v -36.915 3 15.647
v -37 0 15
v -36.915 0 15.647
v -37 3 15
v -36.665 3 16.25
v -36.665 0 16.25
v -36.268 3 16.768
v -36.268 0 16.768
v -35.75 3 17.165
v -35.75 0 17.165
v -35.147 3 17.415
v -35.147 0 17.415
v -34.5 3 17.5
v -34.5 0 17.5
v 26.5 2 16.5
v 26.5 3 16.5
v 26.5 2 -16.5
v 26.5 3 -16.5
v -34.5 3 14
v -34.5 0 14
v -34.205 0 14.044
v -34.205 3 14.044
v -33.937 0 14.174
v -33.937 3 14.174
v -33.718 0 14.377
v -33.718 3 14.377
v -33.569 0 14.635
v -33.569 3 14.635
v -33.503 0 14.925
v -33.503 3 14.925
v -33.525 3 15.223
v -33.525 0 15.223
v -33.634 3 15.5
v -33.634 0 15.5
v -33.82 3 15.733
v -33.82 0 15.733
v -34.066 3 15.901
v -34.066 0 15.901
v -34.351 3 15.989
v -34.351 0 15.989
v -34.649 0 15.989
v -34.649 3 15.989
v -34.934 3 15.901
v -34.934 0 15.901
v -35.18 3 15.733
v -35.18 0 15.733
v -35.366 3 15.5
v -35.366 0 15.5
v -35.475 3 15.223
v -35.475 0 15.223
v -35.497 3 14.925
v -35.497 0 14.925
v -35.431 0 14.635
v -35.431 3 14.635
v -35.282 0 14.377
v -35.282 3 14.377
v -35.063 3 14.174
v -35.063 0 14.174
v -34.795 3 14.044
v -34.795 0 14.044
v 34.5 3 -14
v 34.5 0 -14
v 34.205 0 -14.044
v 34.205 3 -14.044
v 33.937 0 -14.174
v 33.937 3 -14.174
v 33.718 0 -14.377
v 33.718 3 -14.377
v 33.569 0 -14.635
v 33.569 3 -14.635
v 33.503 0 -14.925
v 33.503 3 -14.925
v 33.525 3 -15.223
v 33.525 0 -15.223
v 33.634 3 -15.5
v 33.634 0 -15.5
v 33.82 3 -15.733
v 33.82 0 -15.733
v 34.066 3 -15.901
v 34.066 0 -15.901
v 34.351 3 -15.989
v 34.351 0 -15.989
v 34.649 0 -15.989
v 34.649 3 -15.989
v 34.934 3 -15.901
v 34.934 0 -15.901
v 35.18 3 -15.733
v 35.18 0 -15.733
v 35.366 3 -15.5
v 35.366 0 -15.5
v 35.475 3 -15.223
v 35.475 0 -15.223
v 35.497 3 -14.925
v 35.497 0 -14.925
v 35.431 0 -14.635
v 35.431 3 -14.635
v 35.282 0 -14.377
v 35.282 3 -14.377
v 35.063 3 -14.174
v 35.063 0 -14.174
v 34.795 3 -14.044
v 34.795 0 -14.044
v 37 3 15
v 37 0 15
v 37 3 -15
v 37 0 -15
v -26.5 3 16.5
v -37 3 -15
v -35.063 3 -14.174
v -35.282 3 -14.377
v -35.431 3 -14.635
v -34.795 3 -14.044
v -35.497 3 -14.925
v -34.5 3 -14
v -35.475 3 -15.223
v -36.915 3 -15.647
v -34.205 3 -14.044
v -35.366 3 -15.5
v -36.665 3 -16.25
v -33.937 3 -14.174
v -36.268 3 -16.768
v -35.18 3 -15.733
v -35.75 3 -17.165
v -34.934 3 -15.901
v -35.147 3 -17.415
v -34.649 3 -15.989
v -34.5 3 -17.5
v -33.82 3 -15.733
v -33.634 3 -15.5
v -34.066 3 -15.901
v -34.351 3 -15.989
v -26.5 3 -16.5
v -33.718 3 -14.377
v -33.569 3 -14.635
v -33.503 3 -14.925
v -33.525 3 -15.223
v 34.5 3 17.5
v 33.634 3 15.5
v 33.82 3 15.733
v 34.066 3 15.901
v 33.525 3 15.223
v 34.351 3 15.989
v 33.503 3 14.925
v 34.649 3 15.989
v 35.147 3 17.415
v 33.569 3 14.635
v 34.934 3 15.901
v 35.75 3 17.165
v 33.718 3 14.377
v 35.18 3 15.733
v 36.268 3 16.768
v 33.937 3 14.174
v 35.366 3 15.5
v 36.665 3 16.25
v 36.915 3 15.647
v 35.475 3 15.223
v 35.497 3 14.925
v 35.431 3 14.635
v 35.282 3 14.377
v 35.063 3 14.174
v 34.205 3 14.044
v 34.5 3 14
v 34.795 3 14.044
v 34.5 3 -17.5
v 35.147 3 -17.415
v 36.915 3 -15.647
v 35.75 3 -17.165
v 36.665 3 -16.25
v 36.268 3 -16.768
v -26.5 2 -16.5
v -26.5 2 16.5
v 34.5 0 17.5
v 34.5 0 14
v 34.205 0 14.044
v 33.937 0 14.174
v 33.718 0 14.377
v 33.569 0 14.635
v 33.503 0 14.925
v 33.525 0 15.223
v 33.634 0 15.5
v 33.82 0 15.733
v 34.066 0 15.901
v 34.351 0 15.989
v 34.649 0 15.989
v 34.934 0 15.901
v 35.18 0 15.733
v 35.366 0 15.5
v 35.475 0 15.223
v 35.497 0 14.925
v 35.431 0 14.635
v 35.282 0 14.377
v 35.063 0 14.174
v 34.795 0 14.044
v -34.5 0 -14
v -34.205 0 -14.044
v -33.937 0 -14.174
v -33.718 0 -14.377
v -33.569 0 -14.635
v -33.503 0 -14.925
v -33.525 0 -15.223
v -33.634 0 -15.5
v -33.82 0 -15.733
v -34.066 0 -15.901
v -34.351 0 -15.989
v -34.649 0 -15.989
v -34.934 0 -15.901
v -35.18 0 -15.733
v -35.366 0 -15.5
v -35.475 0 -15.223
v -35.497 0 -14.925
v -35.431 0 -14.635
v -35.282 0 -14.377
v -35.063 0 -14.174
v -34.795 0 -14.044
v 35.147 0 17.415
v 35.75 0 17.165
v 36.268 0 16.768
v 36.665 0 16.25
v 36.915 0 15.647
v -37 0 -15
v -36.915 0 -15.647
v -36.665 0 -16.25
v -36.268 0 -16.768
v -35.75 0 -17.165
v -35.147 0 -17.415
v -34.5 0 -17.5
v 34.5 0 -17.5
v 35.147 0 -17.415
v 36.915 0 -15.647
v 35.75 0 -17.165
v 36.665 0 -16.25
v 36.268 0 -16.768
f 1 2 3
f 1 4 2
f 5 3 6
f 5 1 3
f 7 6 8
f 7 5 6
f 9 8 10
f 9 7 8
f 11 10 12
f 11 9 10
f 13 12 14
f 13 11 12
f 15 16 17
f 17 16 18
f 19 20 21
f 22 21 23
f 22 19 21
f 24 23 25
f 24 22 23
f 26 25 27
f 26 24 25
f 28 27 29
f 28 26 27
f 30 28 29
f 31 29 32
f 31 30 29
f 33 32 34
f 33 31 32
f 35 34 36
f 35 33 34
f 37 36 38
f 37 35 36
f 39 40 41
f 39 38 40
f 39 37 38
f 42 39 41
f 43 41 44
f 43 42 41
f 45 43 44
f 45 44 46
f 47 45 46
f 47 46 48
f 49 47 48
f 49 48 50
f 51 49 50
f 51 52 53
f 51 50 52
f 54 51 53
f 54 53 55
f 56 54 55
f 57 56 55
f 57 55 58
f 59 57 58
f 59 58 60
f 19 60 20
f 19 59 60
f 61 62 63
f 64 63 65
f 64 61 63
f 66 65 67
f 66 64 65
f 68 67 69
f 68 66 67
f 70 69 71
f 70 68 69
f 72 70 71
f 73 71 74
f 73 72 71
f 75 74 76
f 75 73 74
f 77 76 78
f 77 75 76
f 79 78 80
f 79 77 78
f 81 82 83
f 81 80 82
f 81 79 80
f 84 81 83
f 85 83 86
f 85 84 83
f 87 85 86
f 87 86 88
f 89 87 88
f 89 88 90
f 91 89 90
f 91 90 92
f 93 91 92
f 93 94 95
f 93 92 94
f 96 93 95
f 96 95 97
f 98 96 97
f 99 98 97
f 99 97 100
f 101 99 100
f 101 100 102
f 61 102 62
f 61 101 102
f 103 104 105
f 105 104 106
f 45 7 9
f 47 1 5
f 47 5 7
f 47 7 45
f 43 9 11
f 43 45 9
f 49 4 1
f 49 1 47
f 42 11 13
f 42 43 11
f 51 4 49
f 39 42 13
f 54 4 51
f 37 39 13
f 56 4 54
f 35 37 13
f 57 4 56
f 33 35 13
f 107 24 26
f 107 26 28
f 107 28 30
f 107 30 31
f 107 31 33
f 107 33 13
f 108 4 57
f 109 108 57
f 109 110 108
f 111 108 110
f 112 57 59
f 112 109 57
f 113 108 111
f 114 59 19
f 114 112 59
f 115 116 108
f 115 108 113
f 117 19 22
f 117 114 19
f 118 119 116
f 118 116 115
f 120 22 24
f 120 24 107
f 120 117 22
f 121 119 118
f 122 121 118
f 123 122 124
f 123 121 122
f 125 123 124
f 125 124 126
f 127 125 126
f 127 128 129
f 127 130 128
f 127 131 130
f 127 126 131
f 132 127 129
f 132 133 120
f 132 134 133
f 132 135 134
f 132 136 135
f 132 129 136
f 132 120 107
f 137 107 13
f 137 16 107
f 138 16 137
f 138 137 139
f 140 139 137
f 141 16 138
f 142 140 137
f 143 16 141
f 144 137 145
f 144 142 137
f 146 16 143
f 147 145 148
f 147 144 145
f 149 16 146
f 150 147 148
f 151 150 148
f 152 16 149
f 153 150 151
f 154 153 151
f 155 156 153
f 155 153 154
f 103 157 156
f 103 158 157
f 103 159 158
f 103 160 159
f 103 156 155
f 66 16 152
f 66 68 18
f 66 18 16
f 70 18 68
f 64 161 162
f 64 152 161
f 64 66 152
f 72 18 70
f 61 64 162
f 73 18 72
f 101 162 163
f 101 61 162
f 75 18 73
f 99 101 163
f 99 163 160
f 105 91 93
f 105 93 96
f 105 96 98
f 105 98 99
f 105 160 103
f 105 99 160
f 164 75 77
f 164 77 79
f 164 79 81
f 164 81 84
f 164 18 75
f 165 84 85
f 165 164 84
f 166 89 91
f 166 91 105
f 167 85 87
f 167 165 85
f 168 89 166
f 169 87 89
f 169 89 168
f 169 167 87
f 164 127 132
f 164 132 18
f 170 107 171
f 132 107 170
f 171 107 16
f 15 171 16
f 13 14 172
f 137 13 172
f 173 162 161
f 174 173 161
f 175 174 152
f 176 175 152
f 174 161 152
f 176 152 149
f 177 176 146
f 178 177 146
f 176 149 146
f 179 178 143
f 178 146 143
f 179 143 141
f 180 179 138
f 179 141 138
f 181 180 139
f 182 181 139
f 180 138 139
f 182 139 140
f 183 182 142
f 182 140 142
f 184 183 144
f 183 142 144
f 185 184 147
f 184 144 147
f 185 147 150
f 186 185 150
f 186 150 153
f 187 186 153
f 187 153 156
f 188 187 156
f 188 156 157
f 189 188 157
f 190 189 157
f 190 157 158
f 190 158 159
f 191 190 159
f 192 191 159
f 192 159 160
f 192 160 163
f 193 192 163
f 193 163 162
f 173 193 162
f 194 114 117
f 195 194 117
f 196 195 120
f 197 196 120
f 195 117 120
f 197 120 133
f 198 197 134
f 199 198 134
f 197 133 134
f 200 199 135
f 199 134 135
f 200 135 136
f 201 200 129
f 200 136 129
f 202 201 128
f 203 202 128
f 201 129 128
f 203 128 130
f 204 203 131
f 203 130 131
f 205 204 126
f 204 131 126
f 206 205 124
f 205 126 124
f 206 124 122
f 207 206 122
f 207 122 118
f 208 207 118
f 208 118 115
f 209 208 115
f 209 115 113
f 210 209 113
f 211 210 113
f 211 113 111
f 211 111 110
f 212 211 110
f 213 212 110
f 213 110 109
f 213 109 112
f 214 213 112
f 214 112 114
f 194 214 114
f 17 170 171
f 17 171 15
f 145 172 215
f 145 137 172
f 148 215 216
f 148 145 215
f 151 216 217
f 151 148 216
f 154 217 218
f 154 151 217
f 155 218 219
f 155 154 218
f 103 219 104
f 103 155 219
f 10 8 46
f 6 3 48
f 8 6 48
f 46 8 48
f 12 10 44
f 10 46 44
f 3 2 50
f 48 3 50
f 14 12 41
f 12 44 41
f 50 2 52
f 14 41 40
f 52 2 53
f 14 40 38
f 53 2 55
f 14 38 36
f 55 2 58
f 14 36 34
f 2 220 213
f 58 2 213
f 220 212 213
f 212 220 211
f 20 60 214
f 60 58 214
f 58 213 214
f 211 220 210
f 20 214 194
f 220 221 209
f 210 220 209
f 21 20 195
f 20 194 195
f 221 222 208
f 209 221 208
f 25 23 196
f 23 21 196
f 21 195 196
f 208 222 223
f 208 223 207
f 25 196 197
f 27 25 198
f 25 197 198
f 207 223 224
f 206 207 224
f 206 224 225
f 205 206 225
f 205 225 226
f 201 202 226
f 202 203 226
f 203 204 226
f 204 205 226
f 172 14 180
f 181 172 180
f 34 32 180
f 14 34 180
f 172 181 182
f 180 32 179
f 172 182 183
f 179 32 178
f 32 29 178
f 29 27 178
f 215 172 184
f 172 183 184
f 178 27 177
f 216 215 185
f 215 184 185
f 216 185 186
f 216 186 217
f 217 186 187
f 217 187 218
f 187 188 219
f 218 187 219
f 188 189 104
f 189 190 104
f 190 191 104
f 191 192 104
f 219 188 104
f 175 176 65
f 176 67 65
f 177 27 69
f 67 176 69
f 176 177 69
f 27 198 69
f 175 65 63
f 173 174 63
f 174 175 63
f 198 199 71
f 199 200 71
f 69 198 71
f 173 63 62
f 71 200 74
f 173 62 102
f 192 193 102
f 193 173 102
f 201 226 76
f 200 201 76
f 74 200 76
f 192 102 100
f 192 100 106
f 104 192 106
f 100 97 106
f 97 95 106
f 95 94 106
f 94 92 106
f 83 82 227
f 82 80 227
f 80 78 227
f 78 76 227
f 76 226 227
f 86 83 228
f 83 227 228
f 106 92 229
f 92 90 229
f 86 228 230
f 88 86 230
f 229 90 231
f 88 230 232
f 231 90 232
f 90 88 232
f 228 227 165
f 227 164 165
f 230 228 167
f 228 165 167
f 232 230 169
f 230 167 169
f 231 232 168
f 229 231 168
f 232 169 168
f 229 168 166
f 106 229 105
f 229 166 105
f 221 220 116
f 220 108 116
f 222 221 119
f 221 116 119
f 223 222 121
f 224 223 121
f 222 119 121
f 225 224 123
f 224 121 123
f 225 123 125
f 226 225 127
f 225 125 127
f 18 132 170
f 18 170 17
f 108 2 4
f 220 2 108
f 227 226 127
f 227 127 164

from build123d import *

# Parameters (mm, degrees)
SZKIC1_W                    = 74
SZKIC1_H                    = 35
DODANIE_WYCI_GNI_CIE1_DEPTH = 3
SZKIC2_W                    = 53
SZKIC2_H                    = 33
WYTNIJ_WYCI_GNI_CIE1_DEPTH  = 1
SZKIC4_R                    = 1
WYTNIJ_WYCI_GNI_CIE2_DEPTH  = 42.039615008
ZAOKR_GLENIE1_R             = 2.5
LUSTRO2_COPY_1_SKETCH_R     = 1
LUSTRO2_COPY_1_DEPTH        = 42.039615008


with BuildPart() as part:
    # Szkic1 → Dodanie-wyciągnięcie1 (new body)
    with BuildSketch(Plane(origin=(0, 0, 0), x_dir=(1, 0, 0), z_dir=(0, 1, 0))):
        Rectangle(SZKIC1_W, SZKIC1_H)
    extrude(amount=DODANIE_WYCI_GNI_CIE1_DEPTH)

    # Szkic2 → Wytnij-wyciągnięcie1 (cut)
    with BuildSketch(Plane(origin=(0, 3, 0), x_dir=(1, 0, 0), z_dir=(0, 1, 0))):
        Rectangle(SZKIC2_W, SZKIC2_H)
    extrude(amount=-WYTNIJ_WYCI_GNI_CIE1_DEPTH, mode=Mode.SUBTRACT)

    # Szkic4 → Wytnij-wyciągnięcie2 (cut, through all)
    with BuildSketch(Plane(origin=(0, 3, 0), x_dir=(1, 0, 0), z_dir=(0, 1, 0))):
        with Locations(Location((-34.5, 15, 0), (0, 0, 270))):
            Circle(SZKIC4_R)
    wytnij_wyci_gni_cie2 = extrude(amount=-WYTNIJ_WYCI_GNI_CIE2_DEPTH, mode=Mode.SUBTRACT)

    # Zaokrąglenie1
    zaokr_glenie1_edges = [part.edges().sort_by_distance(p)[0] for p in [
        (37, 1.5, 17.5),
        (-37, 1.5, 17.5),
        (-37, 1.5, -17.5),
        (37, 1.5, -17.5),
    ]]
    fillet(zaokr_glenie1_edges, radius=ZAOKR_GLENIE1_R)

    # Lustro1: Wytnij-wyciągnięcie2 across plane
    add(wytnij_wyci_gni_cie2.mirror(Plane.XY), mode=Mode.SUBTRACT)

    # Lustro2: Wytnij-wyciągnięcie2 across plane
    add(wytnij_wyci_gni_cie2.mirror(Plane(origin=(0, 0, 0), x_dir=(0, 0, 1), z_dir=(1, 0, 0))), mode=Mode.SUBTRACT)

    # Lustro2 copy 1 sketch → Lustro2 copy 1 (cut, through all)
    with BuildSketch(Plane(origin=(0, 3, 0), x_dir=(-1, 0, 0), z_dir=(0, 1, 0))):
        with Locations(Location((-34.5, 15, 0), (0, 0, 270))):
            Circle(LUSTRO2_COPY_1_SKETCH_R)
    extrude(amount=-LUSTRO2_COPY_1_DEPTH, mode=Mode.SUBTRACT)


solid = part.part
